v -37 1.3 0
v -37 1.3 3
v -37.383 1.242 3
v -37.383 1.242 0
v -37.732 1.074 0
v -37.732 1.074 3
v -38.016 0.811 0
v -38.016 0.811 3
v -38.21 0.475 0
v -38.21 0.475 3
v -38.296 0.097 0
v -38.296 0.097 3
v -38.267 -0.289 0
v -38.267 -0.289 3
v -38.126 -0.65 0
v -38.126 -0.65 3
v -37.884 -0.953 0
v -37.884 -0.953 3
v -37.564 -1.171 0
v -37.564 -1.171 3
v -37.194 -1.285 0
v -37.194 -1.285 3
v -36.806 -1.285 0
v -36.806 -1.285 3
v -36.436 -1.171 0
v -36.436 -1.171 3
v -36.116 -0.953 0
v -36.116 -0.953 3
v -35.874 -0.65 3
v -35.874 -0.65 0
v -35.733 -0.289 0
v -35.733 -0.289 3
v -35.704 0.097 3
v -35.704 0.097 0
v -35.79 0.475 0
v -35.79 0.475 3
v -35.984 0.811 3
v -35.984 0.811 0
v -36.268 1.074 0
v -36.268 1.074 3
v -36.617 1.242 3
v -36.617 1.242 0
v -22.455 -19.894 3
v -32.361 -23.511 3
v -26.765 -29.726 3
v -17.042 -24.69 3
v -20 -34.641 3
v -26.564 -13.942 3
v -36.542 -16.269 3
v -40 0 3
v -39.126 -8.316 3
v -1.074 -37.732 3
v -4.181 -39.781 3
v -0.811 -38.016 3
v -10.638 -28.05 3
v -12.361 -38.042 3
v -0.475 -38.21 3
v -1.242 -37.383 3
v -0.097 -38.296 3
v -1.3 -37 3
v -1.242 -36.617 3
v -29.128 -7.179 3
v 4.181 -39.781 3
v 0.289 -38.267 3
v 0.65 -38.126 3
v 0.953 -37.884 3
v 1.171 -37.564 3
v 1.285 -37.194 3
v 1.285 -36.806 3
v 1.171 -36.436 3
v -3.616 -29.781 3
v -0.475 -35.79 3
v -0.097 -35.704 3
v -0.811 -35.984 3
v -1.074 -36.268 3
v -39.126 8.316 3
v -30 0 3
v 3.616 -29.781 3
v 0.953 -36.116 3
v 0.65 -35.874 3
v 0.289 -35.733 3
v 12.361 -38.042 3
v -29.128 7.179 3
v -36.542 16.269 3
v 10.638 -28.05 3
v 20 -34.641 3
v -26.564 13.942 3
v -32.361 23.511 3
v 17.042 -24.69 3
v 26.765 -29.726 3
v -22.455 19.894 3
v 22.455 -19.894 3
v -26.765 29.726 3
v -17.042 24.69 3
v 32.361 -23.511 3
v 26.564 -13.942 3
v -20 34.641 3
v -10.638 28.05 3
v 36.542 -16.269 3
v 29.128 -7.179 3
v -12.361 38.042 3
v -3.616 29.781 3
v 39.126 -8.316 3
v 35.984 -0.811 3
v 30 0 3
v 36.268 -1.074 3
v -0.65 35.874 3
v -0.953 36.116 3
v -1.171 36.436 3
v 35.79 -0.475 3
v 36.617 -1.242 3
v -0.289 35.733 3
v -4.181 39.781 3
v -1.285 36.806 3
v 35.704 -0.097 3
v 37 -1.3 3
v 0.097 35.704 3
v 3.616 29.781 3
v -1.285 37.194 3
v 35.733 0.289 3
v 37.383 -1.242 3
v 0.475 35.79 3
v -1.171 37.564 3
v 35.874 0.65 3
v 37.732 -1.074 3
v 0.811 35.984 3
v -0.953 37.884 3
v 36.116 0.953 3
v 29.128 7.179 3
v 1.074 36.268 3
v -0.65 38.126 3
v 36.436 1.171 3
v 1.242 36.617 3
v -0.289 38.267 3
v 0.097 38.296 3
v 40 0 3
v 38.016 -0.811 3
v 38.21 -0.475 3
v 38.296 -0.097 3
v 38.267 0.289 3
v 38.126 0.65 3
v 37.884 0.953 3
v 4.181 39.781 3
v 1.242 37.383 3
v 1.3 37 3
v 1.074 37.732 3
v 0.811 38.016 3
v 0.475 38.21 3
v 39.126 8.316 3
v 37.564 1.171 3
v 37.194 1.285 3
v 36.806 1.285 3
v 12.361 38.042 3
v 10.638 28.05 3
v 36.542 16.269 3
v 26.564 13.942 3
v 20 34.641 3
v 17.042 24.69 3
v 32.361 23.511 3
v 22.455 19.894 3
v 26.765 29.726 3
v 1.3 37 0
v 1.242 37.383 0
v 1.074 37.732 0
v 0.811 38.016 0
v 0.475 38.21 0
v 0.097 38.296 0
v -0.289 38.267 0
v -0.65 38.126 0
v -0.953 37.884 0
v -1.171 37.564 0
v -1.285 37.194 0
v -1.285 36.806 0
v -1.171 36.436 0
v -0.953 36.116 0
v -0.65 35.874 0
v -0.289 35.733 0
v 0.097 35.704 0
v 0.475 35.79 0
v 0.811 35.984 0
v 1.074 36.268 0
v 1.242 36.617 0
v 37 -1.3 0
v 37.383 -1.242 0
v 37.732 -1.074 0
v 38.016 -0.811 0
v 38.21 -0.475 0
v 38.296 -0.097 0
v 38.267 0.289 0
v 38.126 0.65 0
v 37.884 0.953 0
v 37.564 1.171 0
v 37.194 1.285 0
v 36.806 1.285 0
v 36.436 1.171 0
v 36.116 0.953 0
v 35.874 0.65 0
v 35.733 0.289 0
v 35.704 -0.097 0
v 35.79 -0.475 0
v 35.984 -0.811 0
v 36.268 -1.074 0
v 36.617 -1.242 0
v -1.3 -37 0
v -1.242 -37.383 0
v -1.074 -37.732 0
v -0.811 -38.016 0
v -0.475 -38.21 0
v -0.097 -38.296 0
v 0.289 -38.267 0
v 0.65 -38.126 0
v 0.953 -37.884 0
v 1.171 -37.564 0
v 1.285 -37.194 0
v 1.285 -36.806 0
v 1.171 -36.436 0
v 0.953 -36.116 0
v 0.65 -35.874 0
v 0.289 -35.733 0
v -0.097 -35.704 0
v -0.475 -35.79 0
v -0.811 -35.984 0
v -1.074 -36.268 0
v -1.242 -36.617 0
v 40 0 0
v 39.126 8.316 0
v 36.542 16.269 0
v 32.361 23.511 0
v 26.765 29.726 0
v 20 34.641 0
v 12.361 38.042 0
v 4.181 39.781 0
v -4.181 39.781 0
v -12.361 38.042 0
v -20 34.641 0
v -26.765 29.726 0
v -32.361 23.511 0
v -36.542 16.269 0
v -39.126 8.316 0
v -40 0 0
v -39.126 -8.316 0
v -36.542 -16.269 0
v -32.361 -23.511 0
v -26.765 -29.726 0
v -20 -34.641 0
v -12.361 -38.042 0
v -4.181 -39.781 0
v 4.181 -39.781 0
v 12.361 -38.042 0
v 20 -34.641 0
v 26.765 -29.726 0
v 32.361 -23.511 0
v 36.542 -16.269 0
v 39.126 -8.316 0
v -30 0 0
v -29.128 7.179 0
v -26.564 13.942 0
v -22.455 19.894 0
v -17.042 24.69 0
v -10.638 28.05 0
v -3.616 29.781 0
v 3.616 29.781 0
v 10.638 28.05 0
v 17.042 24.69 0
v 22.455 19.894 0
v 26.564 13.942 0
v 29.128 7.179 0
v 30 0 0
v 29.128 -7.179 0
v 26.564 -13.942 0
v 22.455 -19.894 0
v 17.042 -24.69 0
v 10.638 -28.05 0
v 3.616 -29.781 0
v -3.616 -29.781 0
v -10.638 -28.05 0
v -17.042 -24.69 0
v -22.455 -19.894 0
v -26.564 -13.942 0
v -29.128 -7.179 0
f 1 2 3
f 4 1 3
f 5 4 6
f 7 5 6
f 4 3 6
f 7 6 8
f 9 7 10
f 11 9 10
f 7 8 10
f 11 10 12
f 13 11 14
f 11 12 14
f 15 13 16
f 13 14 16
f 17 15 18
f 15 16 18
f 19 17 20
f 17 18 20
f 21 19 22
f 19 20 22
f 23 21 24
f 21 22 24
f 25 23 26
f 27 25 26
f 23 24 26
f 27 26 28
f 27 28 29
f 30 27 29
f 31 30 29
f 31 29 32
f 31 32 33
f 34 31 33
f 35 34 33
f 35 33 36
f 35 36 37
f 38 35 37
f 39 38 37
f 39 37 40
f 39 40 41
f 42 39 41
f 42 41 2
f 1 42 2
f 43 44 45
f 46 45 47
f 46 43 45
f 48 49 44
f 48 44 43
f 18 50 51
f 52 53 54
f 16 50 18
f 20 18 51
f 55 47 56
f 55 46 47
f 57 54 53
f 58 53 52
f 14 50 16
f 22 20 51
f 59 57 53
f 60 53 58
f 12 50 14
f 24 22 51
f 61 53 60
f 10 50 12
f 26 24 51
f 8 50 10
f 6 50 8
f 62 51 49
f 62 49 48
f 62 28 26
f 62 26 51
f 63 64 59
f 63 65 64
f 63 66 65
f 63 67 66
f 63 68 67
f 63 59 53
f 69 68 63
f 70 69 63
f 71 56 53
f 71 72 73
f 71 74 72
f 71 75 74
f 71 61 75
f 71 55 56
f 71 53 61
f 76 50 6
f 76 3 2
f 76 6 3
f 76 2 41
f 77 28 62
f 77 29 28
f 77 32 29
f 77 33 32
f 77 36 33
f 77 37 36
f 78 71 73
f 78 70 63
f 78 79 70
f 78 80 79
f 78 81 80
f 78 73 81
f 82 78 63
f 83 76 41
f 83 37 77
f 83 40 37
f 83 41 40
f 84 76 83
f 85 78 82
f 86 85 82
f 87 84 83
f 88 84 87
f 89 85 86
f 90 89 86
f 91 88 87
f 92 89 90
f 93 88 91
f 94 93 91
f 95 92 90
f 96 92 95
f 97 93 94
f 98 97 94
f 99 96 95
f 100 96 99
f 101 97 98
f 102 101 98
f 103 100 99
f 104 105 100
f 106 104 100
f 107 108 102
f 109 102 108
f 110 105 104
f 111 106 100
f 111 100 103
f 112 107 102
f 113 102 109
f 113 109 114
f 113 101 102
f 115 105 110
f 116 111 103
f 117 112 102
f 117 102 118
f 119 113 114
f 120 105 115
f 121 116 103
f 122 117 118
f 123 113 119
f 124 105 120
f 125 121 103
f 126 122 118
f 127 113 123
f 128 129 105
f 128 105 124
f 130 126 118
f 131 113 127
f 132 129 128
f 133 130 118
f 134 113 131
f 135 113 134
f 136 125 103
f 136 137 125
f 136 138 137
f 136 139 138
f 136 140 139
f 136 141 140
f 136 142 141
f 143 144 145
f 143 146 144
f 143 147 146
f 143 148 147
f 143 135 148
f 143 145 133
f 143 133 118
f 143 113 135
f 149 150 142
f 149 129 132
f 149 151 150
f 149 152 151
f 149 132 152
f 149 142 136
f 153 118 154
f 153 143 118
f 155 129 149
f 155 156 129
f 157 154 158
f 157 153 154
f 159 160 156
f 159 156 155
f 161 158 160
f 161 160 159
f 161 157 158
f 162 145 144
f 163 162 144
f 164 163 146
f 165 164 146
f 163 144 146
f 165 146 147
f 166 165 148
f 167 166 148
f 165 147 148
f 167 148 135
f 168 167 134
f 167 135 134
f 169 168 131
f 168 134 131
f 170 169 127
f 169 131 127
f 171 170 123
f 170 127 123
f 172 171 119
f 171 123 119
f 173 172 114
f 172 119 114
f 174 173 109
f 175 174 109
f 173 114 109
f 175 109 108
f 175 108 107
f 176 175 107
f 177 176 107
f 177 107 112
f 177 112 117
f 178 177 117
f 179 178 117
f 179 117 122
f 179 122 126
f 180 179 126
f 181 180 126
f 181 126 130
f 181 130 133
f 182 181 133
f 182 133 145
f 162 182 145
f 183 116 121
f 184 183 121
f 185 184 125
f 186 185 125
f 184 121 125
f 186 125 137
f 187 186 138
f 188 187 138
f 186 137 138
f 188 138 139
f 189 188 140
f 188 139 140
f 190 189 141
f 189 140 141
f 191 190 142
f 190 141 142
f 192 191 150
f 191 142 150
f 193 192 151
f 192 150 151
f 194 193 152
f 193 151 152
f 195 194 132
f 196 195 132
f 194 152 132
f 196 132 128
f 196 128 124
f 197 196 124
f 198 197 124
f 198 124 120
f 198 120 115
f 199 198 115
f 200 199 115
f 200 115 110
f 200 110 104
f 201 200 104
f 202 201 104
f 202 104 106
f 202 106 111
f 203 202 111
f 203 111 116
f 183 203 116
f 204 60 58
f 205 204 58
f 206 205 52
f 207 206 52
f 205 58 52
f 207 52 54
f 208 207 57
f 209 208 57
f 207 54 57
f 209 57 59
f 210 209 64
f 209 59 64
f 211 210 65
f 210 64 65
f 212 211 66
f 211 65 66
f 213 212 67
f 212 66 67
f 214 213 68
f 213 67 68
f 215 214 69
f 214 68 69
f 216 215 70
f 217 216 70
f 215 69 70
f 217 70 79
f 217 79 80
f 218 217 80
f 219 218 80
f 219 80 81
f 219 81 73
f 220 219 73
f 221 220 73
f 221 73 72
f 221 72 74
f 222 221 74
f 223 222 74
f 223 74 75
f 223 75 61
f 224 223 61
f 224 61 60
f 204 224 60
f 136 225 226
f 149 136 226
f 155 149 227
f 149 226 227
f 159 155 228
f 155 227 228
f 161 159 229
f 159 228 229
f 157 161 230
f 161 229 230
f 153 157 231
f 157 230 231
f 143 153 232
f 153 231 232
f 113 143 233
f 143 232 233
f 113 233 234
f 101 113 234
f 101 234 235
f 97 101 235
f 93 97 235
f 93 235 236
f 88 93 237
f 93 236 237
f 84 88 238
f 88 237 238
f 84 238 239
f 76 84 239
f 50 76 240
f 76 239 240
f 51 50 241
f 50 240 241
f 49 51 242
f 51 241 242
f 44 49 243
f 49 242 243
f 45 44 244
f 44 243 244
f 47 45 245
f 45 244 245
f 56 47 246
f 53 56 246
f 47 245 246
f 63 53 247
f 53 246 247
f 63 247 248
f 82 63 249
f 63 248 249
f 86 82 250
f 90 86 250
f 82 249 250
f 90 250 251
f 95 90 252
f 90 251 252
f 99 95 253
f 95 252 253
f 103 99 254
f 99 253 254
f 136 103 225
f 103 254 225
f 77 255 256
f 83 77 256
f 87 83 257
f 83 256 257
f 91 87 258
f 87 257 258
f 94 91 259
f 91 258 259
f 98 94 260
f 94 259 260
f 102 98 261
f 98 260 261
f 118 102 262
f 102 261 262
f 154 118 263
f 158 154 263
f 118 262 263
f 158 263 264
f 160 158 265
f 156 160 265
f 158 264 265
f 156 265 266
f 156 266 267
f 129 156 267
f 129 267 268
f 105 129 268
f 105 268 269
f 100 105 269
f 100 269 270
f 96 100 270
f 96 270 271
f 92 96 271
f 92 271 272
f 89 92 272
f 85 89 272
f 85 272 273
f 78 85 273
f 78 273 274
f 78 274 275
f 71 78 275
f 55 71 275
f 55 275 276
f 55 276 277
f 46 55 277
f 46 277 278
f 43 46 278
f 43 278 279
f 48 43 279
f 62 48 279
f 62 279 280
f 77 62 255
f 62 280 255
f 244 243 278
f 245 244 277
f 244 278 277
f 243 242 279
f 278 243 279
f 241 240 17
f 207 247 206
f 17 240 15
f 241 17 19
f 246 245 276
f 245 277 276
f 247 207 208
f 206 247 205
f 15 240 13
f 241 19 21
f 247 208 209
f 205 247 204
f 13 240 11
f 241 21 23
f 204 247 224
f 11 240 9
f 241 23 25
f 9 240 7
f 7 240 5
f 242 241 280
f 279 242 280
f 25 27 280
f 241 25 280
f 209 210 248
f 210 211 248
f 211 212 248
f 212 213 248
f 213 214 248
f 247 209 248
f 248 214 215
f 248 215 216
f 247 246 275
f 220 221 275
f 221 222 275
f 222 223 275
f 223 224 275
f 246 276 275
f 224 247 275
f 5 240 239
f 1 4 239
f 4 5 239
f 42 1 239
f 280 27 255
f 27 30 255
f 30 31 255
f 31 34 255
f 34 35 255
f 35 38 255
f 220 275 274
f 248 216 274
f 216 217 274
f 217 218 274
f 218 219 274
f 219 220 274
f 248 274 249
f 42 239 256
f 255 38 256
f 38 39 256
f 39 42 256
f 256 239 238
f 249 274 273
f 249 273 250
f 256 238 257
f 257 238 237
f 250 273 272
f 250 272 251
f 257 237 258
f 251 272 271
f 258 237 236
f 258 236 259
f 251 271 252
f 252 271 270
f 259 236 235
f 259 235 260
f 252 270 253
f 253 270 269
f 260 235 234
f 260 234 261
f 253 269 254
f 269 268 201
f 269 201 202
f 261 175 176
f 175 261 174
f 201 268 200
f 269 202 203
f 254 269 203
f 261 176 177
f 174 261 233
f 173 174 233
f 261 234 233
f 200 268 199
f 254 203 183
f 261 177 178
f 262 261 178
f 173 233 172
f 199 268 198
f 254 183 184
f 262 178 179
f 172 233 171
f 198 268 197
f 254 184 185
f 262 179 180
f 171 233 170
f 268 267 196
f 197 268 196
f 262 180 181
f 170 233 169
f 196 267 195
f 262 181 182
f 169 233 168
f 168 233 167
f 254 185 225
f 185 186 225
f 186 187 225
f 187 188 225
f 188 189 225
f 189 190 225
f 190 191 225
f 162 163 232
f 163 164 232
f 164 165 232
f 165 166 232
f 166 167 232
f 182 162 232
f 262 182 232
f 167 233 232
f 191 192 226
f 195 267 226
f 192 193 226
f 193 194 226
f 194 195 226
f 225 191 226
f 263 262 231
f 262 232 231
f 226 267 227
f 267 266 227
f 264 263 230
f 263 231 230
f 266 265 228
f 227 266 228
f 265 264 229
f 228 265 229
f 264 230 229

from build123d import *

# Parameters (mm, degrees)
ESQUISSE1_R                  = 40
BOSS_EXTRU_1_DEPTH           = 3
D_GAGEMENT_M21_D             = 2.6
R_P_TITION_CIRCULAIRE1_COUNT = 4
ESQUISSE4_R                  = 30
ENL_V_MAT_EXTRU_1_DEPTH      = 10


with BuildPart() as part:
    # Esquisse1 → Boss.-Extru.1 (new body)
    with BuildSketch(Plane.XY):
        Circle(ESQUISSE1_R)
    extrude(amount=BOSS_EXTRU_1_DEPTH)

    # Dégagement M21 (through all)
    with Locations(Plane(origin=(0, 0, 0), x_dir=(-1, 0, 0), z_dir=(0, 0, -1))):
        with Locations((0, 37)):
            d_gagement_m21 = Hole(D_GAGEMENT_M21_D / 2)

    # Répétition circulaire1: Dégagement M21 ×4 about axis
    r_p_tition_circulaire1_axis = Axis((0, 0, 0), (0, 0, 1))
    for i in range(1, R_P_TITION_CIRCULAIRE1_COUNT):
        add(d_gagement_m21.rotate(r_p_tition_circulaire1_axis, i * 360 / R_P_TITION_CIRCULAIRE1_COUNT), mode=Mode.SUBTRACT)

    # Esquisse4 → Enlèv. mat.-Extru.1 (cut)
    with BuildSketch(Plane(origin=(0, 0, 0), x_dir=(-1, 0, 0), z_dir=(0, 0, -1))):
        Circle(ESQUISSE4_R)
    extrude(amount=-ENL_V_MAT_EXTRU_1_DEPTH, mode=Mode.SUBTRACT)


solid = part.part
